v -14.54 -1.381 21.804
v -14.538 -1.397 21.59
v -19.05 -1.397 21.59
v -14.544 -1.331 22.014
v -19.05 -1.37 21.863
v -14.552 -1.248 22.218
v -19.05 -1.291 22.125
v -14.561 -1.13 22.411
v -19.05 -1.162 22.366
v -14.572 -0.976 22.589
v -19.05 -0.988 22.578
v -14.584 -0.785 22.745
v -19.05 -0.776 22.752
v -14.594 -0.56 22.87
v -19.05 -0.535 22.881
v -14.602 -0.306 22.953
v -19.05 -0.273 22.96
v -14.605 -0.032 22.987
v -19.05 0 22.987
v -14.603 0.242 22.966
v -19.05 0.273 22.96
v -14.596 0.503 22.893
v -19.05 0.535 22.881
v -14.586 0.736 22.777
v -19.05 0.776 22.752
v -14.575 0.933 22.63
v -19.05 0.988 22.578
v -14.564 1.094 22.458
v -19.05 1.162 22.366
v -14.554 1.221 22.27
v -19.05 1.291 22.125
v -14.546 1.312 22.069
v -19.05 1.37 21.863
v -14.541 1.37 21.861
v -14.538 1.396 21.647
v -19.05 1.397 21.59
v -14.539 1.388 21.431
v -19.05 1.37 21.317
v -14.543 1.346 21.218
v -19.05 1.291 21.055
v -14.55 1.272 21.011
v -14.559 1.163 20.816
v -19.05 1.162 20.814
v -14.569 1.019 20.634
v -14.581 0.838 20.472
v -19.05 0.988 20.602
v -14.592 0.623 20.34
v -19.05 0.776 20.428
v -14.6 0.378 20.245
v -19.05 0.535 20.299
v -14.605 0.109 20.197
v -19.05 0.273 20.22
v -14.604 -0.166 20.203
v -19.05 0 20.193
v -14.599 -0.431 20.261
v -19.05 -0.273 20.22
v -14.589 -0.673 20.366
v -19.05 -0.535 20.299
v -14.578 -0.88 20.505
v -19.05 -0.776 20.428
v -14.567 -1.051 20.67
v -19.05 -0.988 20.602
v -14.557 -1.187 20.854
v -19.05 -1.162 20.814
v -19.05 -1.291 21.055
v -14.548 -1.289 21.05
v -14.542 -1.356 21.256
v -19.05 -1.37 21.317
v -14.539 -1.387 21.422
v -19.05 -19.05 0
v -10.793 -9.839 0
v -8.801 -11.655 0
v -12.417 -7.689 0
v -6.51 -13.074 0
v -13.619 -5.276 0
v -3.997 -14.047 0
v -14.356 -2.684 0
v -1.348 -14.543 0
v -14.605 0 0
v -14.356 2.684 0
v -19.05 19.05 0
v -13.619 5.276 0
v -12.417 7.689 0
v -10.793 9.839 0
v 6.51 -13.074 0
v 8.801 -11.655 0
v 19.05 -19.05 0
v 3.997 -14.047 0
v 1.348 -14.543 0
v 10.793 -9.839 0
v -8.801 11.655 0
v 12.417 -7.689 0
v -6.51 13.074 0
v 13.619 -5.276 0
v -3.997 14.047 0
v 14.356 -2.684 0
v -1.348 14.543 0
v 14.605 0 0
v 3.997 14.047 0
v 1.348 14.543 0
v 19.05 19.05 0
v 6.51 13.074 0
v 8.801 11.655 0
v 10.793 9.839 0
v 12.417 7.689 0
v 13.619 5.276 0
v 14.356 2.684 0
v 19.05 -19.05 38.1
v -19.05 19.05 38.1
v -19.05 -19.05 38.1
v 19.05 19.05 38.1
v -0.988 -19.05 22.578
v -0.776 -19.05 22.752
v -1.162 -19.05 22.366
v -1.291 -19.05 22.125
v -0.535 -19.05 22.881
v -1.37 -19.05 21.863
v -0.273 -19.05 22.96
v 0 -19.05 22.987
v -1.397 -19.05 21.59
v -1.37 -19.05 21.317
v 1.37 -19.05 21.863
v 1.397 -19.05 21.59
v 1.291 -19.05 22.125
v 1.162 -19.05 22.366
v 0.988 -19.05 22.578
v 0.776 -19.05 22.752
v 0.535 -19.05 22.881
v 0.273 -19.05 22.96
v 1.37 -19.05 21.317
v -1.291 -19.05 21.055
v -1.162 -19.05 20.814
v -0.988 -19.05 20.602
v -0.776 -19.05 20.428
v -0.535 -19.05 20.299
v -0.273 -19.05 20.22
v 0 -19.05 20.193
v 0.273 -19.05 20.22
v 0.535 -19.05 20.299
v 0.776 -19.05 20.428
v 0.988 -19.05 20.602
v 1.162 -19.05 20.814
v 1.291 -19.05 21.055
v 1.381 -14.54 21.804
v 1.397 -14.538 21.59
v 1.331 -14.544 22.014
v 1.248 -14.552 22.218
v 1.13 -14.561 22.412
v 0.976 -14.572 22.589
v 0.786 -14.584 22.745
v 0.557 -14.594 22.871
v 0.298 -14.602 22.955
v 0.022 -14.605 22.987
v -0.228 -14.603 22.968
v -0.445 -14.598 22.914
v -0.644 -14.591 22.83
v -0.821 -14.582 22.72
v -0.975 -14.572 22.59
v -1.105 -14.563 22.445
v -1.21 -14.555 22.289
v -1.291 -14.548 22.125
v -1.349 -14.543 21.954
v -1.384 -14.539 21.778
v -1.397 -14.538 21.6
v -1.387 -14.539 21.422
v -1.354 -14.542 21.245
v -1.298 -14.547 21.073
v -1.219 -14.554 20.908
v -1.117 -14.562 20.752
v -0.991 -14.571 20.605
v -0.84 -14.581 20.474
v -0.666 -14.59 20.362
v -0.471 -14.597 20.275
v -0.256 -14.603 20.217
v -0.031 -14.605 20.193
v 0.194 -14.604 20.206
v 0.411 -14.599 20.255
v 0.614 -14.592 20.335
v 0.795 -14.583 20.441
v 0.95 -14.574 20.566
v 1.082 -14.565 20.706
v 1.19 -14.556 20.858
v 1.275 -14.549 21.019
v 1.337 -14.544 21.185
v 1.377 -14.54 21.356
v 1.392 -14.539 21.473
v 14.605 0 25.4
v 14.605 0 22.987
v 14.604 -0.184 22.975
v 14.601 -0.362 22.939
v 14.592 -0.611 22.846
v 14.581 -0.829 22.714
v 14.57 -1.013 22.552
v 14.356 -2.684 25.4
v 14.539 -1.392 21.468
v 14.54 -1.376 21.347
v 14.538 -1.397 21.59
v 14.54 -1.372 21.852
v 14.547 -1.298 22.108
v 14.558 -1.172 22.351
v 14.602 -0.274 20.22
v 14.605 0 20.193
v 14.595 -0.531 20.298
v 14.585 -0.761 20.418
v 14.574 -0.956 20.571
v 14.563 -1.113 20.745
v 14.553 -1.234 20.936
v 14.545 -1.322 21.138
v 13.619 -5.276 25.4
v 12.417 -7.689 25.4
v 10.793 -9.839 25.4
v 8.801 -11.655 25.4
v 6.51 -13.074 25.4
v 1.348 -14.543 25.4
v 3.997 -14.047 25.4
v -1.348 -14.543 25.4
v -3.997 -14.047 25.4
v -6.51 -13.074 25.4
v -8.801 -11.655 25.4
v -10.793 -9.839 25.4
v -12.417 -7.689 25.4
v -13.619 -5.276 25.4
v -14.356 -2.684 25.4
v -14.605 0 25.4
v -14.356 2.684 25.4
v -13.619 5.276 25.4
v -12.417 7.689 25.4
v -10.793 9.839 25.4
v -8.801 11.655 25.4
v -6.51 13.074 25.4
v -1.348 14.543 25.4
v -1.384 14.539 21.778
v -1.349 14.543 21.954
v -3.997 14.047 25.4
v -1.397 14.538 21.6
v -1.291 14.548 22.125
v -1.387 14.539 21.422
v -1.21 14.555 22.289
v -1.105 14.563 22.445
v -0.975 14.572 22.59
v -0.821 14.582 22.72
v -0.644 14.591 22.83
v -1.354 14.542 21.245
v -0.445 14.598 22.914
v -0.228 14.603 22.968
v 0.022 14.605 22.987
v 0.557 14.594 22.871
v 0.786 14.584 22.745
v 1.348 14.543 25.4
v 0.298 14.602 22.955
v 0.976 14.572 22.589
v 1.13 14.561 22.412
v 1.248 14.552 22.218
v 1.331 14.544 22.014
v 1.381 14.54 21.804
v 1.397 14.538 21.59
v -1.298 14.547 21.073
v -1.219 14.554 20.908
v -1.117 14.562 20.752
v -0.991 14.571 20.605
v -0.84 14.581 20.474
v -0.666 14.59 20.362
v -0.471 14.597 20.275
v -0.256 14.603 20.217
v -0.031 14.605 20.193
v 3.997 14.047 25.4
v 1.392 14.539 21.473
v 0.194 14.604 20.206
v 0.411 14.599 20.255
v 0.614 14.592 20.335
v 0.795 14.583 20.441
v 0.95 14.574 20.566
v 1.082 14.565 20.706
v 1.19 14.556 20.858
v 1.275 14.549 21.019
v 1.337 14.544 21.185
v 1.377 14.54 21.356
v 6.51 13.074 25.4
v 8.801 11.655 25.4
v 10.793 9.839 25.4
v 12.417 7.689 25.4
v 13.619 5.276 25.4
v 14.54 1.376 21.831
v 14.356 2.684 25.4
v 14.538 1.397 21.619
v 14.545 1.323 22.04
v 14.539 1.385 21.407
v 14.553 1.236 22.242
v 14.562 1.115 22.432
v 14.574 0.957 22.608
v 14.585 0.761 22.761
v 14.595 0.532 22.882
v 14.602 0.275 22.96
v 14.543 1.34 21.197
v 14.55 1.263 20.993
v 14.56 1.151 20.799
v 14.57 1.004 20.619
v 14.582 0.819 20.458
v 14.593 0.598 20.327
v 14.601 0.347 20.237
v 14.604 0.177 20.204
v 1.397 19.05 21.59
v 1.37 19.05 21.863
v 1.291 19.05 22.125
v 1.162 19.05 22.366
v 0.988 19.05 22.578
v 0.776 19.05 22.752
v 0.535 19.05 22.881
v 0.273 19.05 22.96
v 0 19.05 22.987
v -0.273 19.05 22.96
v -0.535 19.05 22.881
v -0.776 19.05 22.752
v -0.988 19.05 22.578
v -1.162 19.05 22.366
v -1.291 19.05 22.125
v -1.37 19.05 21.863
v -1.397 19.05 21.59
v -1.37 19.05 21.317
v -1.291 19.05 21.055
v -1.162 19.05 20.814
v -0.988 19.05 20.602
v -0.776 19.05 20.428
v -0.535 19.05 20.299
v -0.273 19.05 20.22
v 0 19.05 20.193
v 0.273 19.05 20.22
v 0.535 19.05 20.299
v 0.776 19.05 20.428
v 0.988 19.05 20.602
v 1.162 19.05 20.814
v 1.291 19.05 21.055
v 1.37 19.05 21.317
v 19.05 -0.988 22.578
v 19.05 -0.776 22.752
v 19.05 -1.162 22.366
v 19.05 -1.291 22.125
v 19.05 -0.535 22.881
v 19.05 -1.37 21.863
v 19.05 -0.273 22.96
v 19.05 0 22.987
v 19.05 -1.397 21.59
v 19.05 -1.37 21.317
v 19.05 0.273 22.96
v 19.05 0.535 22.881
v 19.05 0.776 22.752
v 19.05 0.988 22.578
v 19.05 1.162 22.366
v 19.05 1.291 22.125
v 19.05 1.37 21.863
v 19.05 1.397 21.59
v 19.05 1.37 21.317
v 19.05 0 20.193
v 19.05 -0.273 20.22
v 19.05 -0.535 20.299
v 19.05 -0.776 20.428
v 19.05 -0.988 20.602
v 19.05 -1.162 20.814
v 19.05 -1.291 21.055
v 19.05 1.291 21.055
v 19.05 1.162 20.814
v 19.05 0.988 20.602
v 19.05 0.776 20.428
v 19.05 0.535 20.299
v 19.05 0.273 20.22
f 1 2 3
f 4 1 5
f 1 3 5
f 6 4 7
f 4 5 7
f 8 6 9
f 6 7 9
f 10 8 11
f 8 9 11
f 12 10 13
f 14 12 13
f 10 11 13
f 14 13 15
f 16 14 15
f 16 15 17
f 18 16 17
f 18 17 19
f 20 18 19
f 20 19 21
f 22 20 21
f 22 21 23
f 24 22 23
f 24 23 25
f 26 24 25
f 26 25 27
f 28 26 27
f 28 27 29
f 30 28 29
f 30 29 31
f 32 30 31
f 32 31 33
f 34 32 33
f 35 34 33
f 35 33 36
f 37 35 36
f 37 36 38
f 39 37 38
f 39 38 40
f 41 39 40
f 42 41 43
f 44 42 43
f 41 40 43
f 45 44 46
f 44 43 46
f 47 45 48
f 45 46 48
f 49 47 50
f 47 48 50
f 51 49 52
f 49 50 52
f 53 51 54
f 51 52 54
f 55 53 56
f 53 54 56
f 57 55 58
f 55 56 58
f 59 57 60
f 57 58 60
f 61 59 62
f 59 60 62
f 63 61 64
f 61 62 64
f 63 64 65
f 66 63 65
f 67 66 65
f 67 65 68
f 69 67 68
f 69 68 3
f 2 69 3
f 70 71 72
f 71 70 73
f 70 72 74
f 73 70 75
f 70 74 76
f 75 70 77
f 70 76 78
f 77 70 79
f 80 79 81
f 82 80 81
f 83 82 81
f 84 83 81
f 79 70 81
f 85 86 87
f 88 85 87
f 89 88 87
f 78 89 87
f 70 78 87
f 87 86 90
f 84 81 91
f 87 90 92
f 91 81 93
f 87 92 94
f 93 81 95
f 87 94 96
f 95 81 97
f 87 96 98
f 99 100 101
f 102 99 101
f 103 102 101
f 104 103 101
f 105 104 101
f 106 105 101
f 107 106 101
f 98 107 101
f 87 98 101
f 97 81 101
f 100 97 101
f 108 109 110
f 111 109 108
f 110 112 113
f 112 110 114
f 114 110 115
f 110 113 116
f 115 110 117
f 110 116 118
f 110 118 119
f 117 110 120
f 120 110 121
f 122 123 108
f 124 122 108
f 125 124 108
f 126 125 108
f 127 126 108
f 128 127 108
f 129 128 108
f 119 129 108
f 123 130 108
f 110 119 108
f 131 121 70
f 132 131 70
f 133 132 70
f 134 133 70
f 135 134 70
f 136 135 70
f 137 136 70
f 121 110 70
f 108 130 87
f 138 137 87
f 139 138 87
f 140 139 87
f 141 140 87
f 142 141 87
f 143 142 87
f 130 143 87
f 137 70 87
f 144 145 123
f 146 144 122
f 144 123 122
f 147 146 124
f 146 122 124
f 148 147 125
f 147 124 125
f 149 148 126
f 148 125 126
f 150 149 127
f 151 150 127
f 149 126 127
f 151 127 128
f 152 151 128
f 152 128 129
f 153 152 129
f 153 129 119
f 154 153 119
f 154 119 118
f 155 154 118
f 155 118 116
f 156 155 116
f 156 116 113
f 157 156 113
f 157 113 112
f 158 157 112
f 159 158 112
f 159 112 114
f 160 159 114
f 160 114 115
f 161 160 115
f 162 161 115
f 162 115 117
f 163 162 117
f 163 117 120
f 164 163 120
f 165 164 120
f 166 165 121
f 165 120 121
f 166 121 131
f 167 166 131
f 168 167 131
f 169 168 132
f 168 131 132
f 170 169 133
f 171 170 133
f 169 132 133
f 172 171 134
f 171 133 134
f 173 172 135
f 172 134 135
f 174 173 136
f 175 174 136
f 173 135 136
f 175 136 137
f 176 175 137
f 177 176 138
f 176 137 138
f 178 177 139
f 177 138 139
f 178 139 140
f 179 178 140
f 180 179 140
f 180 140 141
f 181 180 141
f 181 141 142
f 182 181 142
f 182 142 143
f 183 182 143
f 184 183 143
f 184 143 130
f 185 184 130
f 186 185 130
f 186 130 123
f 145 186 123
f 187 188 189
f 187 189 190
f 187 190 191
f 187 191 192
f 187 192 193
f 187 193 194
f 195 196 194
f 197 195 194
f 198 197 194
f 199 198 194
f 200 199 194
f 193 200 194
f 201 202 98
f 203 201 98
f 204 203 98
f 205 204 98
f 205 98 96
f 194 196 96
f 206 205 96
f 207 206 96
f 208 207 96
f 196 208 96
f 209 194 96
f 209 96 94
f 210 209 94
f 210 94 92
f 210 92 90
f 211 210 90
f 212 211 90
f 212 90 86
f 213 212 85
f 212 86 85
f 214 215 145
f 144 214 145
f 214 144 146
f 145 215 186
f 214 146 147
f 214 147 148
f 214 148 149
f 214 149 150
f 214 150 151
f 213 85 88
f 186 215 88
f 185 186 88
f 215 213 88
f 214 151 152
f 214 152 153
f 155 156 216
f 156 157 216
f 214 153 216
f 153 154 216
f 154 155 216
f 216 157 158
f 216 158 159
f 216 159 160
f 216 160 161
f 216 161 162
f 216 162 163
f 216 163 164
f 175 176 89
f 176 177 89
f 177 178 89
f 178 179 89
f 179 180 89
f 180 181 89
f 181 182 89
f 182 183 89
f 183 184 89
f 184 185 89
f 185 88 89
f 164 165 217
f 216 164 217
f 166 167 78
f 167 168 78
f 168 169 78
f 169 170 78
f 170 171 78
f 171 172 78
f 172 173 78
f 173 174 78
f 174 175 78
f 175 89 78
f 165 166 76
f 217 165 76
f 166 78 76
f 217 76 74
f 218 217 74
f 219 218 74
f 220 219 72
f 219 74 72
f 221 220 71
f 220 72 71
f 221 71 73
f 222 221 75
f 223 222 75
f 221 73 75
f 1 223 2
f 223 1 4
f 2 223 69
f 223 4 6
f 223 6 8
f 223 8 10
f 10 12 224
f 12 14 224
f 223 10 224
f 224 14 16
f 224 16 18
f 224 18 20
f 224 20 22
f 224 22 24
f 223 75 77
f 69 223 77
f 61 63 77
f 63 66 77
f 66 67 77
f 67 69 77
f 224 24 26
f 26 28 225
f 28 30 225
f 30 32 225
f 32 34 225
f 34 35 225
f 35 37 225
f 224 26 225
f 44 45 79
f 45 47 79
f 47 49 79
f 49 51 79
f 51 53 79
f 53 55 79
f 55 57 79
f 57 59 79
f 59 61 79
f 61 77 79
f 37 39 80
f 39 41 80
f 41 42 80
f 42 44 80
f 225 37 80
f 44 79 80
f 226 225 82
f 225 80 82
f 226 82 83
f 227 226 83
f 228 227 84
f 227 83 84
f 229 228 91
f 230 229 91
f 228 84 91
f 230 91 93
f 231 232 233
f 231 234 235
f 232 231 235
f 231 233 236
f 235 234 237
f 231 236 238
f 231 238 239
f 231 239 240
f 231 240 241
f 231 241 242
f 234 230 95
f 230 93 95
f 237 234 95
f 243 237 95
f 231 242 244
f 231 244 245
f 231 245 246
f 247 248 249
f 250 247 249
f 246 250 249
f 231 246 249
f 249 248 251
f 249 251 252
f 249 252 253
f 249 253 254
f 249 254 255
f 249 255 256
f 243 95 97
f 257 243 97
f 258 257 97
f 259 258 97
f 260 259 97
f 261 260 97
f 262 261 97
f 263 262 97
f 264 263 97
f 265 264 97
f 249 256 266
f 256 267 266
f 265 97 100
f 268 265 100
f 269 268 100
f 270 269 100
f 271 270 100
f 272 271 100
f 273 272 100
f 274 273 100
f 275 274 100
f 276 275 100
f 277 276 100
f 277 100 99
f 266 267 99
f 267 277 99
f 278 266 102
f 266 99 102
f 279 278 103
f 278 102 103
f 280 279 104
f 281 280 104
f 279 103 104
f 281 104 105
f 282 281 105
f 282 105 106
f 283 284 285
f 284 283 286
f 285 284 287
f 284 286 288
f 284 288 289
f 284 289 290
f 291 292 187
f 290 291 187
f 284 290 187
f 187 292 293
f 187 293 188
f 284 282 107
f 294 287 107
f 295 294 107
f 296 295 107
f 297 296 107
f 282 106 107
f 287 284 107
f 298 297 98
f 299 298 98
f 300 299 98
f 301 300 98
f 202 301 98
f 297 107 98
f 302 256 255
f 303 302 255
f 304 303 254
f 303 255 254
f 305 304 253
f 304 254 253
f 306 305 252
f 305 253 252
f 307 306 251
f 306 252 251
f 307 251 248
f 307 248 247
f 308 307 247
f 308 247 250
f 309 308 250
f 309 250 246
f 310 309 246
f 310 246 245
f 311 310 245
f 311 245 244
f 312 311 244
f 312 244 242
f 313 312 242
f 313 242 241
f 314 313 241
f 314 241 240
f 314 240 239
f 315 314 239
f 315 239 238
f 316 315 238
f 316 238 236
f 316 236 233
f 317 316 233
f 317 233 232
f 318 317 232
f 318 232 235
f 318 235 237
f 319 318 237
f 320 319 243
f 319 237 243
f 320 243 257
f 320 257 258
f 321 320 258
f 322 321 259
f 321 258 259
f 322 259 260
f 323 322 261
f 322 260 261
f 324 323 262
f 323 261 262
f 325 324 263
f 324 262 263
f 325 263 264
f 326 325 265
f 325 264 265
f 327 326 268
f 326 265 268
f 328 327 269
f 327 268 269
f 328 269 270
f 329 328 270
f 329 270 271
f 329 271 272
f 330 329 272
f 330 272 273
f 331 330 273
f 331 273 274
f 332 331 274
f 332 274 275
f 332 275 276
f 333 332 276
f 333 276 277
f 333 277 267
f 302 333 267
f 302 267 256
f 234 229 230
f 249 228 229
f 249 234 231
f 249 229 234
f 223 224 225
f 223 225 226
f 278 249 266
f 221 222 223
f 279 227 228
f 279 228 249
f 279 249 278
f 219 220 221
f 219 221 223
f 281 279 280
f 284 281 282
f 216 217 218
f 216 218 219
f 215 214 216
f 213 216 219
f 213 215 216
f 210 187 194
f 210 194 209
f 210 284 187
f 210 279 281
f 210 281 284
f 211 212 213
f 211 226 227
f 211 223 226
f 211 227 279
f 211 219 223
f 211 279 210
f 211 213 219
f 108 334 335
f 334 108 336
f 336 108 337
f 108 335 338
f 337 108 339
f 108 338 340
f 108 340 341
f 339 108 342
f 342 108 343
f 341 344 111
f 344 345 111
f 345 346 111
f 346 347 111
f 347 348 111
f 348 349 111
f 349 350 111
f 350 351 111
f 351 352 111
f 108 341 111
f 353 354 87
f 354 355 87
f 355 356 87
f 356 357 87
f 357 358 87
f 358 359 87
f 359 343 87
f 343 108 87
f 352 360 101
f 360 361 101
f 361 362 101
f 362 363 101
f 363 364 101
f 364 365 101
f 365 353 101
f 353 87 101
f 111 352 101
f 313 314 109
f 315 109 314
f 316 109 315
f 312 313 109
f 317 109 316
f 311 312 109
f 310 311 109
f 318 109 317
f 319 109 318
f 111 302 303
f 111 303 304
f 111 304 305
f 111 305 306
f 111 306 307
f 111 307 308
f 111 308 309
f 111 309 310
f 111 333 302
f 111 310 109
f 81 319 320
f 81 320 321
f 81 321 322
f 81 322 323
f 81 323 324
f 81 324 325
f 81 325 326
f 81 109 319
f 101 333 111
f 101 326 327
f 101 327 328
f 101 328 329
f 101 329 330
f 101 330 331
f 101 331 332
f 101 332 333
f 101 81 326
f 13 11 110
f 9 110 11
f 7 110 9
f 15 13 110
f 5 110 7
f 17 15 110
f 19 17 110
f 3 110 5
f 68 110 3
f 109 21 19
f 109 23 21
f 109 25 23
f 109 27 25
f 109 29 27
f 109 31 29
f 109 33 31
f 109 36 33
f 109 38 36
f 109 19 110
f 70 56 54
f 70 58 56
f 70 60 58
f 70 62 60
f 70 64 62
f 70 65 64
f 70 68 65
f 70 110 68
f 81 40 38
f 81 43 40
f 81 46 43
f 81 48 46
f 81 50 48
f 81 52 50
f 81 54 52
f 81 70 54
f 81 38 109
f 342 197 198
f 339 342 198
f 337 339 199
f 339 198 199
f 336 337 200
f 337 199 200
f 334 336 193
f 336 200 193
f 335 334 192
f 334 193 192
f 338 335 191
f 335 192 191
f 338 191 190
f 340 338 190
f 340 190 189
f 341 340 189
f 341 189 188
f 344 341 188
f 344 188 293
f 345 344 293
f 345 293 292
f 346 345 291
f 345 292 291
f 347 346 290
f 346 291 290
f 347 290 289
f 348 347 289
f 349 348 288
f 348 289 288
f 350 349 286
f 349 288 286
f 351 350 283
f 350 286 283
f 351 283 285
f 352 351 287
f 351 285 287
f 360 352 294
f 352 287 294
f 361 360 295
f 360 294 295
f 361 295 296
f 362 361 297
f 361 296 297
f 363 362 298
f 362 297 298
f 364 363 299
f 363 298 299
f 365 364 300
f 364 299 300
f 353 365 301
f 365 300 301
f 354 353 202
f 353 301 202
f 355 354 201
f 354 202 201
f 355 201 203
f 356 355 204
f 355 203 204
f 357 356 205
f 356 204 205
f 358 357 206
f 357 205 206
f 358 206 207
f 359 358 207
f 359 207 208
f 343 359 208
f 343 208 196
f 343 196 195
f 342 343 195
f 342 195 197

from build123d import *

# Parameters (mm, degrees)
F0_W     = 38.1
F0_H     = 38.1
F1_DEPTH = 38.1
F2_R     = 14.605
F3_DEPTH = 25.4
F5_D     = 2.794
F7_D     = 2.794


with BuildPart() as f1:
    # F0 (on Top) → F1 (new body)
    with BuildSketch(Plane.XY):
        Rectangle(F0_W, F0_H)
    extrude(amount=F1_DEPTH)

    # F2 (on face) → F3 (cut)
    with BuildSketch(Plane(origin=(0, 0, 0), x_dir=(1, 0, 0), z_dir=(0, 0, -1))):
        Circle(F2_R)
    extrude(amount=-F3_DEPTH, mode=Mode.SUBTRACT)

    # F5 (through all)
    with Locations(Plane(origin=(0, 19.05, 0), x_dir=(-1, 0, 0), z_dir=(0, 1, 0))):
        with Locations((0, 21.59)):
            Hole(F5_D / 2)

    # F7 (through all)
    with Locations(Plane.YZ.offset(19.05)):
        with Locations((0, 21.59)):
            Hole(F7_D / 2)


solid = f1.part
